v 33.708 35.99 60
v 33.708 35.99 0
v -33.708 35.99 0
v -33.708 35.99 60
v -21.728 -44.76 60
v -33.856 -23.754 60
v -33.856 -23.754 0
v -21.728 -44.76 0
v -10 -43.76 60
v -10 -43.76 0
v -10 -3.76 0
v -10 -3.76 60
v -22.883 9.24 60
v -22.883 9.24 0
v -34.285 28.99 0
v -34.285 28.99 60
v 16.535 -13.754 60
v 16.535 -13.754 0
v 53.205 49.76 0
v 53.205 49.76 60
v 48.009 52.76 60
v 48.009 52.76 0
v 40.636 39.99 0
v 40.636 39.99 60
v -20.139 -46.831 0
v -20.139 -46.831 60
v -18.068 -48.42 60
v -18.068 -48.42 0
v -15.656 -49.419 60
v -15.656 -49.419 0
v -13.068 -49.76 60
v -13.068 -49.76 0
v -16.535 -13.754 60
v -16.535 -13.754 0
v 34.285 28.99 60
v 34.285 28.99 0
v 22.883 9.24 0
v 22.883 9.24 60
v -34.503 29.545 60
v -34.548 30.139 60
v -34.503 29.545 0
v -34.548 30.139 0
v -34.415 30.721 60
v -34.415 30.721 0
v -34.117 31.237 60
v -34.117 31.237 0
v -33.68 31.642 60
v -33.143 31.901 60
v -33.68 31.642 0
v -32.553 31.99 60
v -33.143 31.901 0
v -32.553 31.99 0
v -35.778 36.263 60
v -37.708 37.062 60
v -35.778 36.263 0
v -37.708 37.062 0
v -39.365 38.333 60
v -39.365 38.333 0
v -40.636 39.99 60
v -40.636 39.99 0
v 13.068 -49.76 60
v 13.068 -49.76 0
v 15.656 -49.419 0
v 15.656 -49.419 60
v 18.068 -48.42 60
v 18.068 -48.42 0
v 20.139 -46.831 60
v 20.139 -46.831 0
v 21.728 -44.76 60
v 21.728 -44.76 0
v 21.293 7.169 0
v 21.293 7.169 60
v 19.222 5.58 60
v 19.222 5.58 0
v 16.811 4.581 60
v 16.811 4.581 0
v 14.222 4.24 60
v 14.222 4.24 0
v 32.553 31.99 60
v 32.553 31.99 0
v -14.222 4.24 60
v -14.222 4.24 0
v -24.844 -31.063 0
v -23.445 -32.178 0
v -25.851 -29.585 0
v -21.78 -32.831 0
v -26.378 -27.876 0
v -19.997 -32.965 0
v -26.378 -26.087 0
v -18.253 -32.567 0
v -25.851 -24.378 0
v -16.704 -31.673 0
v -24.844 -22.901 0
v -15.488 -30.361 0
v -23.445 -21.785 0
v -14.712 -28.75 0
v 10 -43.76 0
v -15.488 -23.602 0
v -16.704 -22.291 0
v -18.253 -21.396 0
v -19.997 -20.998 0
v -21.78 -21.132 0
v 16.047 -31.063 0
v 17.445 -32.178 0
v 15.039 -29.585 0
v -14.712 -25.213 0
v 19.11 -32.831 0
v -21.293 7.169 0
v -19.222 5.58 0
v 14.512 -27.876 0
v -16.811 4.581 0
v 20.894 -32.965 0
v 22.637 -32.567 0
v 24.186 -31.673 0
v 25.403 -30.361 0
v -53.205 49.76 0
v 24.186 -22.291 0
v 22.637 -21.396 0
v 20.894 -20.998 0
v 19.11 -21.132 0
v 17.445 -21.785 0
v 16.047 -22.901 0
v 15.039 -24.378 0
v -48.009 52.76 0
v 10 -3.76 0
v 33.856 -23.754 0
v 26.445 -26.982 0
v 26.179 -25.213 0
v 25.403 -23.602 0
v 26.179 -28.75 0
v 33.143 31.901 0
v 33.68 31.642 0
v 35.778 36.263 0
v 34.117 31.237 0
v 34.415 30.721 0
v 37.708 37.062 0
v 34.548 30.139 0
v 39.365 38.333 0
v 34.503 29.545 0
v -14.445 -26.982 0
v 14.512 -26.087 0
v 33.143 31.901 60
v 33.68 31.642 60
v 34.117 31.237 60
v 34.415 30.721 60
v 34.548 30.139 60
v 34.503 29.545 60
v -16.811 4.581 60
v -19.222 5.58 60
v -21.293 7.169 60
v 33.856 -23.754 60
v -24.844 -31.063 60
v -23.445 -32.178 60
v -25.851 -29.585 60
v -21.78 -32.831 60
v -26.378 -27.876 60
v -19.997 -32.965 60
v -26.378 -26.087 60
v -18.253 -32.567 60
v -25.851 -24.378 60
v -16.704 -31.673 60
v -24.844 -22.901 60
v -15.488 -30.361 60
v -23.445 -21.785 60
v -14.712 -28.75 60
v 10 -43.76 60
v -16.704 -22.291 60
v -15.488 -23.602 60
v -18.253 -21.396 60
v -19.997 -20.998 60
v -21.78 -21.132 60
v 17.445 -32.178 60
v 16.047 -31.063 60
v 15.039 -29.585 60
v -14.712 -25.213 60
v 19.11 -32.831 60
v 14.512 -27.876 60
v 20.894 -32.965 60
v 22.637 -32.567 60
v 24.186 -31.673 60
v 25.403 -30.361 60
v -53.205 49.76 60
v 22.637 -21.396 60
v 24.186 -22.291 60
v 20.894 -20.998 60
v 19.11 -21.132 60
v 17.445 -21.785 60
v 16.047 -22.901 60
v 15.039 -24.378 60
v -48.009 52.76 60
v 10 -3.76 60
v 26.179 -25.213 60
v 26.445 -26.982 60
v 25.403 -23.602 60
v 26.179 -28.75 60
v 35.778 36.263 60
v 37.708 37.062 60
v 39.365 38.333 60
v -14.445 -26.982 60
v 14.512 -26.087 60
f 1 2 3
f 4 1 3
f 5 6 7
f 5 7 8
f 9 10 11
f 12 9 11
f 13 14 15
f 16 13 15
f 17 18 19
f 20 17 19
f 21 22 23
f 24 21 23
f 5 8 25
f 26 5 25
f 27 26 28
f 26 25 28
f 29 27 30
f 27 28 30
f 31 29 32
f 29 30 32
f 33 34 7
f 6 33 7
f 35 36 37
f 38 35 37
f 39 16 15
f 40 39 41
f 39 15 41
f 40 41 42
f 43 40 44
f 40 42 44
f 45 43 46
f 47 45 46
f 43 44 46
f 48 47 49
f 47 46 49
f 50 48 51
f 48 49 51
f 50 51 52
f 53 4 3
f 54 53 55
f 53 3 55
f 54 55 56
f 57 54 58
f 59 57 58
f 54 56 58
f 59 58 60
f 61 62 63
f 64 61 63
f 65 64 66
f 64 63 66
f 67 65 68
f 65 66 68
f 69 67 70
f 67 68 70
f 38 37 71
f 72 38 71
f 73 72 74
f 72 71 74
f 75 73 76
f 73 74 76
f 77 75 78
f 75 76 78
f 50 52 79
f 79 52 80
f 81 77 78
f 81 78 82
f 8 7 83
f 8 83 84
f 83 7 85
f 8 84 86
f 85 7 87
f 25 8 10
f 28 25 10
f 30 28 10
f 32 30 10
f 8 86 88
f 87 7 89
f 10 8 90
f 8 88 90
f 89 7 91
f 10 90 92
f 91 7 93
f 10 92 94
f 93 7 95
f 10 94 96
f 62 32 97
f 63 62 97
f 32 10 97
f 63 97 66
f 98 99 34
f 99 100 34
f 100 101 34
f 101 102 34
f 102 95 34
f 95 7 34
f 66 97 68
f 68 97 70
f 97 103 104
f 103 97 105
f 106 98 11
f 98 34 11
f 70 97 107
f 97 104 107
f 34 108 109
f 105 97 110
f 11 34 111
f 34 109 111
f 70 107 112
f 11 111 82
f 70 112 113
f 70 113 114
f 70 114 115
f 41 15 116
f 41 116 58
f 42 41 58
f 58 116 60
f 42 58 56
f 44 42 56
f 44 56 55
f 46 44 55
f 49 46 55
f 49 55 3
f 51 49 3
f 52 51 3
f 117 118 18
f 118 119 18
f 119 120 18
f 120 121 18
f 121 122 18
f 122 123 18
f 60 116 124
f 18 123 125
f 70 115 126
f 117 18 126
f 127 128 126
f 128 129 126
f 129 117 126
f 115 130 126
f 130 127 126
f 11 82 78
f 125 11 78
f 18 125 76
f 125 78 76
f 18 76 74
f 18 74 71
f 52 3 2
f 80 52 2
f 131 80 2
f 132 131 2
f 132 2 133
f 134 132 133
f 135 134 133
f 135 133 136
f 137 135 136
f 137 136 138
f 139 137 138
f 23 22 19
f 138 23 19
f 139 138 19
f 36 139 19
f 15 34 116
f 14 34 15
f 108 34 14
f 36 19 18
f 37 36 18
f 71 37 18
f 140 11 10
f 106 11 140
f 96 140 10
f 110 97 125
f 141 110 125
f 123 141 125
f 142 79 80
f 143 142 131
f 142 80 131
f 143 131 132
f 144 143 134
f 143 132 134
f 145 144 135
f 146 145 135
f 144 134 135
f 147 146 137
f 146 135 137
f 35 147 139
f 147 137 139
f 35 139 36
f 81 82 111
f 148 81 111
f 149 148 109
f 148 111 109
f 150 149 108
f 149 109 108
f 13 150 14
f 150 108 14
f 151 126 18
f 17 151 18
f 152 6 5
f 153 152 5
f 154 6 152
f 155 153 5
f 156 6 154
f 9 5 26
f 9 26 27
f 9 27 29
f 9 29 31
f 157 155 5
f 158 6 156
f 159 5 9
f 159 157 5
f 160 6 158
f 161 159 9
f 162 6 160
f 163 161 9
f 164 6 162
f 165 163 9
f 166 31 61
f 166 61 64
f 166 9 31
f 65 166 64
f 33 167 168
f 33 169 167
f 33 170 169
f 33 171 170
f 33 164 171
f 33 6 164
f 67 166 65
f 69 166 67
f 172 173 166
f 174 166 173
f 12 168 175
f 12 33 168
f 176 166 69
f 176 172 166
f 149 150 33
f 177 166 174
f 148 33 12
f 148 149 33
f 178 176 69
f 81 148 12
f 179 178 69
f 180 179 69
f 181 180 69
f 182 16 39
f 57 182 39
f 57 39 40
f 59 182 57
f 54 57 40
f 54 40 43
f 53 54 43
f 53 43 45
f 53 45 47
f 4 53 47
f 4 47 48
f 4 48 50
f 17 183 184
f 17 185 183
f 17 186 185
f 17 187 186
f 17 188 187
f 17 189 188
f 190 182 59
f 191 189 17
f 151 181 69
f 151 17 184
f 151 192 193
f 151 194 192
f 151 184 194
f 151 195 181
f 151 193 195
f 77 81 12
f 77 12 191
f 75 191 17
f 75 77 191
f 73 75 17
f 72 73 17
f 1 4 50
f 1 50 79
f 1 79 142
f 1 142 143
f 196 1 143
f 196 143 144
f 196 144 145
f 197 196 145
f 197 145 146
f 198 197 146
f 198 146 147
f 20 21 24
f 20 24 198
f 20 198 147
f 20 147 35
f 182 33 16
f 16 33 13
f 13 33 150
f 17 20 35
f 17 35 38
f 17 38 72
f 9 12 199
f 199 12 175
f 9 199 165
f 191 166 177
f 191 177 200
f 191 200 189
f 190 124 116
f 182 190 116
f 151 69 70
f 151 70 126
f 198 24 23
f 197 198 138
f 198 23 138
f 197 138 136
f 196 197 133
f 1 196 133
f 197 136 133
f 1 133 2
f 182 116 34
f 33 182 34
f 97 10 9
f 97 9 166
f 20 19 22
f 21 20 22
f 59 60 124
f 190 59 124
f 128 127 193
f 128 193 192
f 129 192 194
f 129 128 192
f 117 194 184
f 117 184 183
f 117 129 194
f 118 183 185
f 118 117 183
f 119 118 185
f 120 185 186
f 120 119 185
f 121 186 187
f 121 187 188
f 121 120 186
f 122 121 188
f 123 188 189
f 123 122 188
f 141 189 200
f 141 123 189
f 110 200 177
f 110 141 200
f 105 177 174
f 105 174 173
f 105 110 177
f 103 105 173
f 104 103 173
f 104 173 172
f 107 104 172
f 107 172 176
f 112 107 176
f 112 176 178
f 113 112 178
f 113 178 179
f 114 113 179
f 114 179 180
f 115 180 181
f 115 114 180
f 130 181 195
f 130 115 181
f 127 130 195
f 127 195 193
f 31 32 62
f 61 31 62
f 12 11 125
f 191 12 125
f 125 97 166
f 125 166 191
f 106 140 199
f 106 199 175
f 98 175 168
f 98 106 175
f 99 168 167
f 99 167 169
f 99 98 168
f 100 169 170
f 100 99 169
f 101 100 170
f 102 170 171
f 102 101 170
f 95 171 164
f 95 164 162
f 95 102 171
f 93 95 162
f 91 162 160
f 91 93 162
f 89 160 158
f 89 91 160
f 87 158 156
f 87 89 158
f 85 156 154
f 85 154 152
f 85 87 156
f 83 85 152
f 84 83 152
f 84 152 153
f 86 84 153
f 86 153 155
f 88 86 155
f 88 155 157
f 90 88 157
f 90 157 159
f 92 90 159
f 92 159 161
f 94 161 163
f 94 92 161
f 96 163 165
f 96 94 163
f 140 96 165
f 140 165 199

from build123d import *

# Parameters (mm, degrees)
F0_R     = 6
F0_W     = 20
F0_H     = 40
F1_DEPTH = 60


with BuildPart() as f1:
    # F0 (on Top) → F1 (new body)
    with BuildSketch(Plane.XY):
        with BuildLine():
            Line((-48.008848, 52.76), (-53.205, 49.76))
            Line((-53.205, 49.76), (-16.535, -13.754303))
            Line((-16.535, -13.754303), (-33.855508, -23.754303))
            Line((-33.855508, -23.754303), (-21.727863, -44.76))
            ThreePointArc((-21.727863, -44.76), (-18.067609, -48.420254), (-13.067609, -49.76))
            Line((-13.067609, -49.76), (13.067609, -49.76))
            ThreePointArc((13.067609, -49.76), (18.067609, -48.420254), (21.727863, -44.76))
            Line((21.727863, -44.76), (33.855508, -23.754303))
            Line((33.855508, -23.754303), (16.535, -13.754303))
            Line((16.535, -13.754303), (53.205, 49.76))
            Line((53.205, 49.76), (48.008848, 52.76))
            Line((48.008848, 52.76), (40.636085, 39.99))
            ThreePointArc((40.636085, 39.99), (37.707881, 37.061797), (33.707881, 35.99))
            Line((33.707881, 35.99), (-33.707881, 35.99))
            ThreePointArc((-33.707881, 35.99), (-37.707881, 37.061797), (-40.636085, 39.99))
            Line((-40.636085, 39.99), (-48.008848, 52.76))
        make_face()
        with Locations((-20.445254, -26.981544)):
            Circle(F0_R, mode=Mode.SUBTRACT)
        with Locations((20.445254, -26.981544)):
            Circle(F0_R, mode=Mode.SUBTRACT)
        with Locations((0, -23.76)):
            Rectangle(F0_W, F0_H, mode=Mode.SUBTRACT)
        with BuildLine():
            ThreePointArc((22.882564, 9.24), (19.22231, 5.579746), (14.22231, 4.24))
            Line((14.22231, 4.24), (-14.22231, 4.24))
            ThreePointArc((-14.22231, 4.24), (-19.22231, 5.579746), (-22.882564, 9.24))
            Line((-22.882564, 9.24), (-34.285232, 28.99))
            ThreePointArc((-34.285232, 28.99), (-34.285232, 30.99), (-32.553181, 31.99))
            Line((-32.553181, 31.99), (32.553181, 31.99))
            ThreePointArc((32.553181, 31.99), (34.285232, 30.99), (34.285232, 28.99))
            Line((34.285232, 28.99), (22.882564, 9.24))
        make_face(mode=Mode.SUBTRACT)
    extrude(amount=F1_DEPTH)


solid = f1.part
